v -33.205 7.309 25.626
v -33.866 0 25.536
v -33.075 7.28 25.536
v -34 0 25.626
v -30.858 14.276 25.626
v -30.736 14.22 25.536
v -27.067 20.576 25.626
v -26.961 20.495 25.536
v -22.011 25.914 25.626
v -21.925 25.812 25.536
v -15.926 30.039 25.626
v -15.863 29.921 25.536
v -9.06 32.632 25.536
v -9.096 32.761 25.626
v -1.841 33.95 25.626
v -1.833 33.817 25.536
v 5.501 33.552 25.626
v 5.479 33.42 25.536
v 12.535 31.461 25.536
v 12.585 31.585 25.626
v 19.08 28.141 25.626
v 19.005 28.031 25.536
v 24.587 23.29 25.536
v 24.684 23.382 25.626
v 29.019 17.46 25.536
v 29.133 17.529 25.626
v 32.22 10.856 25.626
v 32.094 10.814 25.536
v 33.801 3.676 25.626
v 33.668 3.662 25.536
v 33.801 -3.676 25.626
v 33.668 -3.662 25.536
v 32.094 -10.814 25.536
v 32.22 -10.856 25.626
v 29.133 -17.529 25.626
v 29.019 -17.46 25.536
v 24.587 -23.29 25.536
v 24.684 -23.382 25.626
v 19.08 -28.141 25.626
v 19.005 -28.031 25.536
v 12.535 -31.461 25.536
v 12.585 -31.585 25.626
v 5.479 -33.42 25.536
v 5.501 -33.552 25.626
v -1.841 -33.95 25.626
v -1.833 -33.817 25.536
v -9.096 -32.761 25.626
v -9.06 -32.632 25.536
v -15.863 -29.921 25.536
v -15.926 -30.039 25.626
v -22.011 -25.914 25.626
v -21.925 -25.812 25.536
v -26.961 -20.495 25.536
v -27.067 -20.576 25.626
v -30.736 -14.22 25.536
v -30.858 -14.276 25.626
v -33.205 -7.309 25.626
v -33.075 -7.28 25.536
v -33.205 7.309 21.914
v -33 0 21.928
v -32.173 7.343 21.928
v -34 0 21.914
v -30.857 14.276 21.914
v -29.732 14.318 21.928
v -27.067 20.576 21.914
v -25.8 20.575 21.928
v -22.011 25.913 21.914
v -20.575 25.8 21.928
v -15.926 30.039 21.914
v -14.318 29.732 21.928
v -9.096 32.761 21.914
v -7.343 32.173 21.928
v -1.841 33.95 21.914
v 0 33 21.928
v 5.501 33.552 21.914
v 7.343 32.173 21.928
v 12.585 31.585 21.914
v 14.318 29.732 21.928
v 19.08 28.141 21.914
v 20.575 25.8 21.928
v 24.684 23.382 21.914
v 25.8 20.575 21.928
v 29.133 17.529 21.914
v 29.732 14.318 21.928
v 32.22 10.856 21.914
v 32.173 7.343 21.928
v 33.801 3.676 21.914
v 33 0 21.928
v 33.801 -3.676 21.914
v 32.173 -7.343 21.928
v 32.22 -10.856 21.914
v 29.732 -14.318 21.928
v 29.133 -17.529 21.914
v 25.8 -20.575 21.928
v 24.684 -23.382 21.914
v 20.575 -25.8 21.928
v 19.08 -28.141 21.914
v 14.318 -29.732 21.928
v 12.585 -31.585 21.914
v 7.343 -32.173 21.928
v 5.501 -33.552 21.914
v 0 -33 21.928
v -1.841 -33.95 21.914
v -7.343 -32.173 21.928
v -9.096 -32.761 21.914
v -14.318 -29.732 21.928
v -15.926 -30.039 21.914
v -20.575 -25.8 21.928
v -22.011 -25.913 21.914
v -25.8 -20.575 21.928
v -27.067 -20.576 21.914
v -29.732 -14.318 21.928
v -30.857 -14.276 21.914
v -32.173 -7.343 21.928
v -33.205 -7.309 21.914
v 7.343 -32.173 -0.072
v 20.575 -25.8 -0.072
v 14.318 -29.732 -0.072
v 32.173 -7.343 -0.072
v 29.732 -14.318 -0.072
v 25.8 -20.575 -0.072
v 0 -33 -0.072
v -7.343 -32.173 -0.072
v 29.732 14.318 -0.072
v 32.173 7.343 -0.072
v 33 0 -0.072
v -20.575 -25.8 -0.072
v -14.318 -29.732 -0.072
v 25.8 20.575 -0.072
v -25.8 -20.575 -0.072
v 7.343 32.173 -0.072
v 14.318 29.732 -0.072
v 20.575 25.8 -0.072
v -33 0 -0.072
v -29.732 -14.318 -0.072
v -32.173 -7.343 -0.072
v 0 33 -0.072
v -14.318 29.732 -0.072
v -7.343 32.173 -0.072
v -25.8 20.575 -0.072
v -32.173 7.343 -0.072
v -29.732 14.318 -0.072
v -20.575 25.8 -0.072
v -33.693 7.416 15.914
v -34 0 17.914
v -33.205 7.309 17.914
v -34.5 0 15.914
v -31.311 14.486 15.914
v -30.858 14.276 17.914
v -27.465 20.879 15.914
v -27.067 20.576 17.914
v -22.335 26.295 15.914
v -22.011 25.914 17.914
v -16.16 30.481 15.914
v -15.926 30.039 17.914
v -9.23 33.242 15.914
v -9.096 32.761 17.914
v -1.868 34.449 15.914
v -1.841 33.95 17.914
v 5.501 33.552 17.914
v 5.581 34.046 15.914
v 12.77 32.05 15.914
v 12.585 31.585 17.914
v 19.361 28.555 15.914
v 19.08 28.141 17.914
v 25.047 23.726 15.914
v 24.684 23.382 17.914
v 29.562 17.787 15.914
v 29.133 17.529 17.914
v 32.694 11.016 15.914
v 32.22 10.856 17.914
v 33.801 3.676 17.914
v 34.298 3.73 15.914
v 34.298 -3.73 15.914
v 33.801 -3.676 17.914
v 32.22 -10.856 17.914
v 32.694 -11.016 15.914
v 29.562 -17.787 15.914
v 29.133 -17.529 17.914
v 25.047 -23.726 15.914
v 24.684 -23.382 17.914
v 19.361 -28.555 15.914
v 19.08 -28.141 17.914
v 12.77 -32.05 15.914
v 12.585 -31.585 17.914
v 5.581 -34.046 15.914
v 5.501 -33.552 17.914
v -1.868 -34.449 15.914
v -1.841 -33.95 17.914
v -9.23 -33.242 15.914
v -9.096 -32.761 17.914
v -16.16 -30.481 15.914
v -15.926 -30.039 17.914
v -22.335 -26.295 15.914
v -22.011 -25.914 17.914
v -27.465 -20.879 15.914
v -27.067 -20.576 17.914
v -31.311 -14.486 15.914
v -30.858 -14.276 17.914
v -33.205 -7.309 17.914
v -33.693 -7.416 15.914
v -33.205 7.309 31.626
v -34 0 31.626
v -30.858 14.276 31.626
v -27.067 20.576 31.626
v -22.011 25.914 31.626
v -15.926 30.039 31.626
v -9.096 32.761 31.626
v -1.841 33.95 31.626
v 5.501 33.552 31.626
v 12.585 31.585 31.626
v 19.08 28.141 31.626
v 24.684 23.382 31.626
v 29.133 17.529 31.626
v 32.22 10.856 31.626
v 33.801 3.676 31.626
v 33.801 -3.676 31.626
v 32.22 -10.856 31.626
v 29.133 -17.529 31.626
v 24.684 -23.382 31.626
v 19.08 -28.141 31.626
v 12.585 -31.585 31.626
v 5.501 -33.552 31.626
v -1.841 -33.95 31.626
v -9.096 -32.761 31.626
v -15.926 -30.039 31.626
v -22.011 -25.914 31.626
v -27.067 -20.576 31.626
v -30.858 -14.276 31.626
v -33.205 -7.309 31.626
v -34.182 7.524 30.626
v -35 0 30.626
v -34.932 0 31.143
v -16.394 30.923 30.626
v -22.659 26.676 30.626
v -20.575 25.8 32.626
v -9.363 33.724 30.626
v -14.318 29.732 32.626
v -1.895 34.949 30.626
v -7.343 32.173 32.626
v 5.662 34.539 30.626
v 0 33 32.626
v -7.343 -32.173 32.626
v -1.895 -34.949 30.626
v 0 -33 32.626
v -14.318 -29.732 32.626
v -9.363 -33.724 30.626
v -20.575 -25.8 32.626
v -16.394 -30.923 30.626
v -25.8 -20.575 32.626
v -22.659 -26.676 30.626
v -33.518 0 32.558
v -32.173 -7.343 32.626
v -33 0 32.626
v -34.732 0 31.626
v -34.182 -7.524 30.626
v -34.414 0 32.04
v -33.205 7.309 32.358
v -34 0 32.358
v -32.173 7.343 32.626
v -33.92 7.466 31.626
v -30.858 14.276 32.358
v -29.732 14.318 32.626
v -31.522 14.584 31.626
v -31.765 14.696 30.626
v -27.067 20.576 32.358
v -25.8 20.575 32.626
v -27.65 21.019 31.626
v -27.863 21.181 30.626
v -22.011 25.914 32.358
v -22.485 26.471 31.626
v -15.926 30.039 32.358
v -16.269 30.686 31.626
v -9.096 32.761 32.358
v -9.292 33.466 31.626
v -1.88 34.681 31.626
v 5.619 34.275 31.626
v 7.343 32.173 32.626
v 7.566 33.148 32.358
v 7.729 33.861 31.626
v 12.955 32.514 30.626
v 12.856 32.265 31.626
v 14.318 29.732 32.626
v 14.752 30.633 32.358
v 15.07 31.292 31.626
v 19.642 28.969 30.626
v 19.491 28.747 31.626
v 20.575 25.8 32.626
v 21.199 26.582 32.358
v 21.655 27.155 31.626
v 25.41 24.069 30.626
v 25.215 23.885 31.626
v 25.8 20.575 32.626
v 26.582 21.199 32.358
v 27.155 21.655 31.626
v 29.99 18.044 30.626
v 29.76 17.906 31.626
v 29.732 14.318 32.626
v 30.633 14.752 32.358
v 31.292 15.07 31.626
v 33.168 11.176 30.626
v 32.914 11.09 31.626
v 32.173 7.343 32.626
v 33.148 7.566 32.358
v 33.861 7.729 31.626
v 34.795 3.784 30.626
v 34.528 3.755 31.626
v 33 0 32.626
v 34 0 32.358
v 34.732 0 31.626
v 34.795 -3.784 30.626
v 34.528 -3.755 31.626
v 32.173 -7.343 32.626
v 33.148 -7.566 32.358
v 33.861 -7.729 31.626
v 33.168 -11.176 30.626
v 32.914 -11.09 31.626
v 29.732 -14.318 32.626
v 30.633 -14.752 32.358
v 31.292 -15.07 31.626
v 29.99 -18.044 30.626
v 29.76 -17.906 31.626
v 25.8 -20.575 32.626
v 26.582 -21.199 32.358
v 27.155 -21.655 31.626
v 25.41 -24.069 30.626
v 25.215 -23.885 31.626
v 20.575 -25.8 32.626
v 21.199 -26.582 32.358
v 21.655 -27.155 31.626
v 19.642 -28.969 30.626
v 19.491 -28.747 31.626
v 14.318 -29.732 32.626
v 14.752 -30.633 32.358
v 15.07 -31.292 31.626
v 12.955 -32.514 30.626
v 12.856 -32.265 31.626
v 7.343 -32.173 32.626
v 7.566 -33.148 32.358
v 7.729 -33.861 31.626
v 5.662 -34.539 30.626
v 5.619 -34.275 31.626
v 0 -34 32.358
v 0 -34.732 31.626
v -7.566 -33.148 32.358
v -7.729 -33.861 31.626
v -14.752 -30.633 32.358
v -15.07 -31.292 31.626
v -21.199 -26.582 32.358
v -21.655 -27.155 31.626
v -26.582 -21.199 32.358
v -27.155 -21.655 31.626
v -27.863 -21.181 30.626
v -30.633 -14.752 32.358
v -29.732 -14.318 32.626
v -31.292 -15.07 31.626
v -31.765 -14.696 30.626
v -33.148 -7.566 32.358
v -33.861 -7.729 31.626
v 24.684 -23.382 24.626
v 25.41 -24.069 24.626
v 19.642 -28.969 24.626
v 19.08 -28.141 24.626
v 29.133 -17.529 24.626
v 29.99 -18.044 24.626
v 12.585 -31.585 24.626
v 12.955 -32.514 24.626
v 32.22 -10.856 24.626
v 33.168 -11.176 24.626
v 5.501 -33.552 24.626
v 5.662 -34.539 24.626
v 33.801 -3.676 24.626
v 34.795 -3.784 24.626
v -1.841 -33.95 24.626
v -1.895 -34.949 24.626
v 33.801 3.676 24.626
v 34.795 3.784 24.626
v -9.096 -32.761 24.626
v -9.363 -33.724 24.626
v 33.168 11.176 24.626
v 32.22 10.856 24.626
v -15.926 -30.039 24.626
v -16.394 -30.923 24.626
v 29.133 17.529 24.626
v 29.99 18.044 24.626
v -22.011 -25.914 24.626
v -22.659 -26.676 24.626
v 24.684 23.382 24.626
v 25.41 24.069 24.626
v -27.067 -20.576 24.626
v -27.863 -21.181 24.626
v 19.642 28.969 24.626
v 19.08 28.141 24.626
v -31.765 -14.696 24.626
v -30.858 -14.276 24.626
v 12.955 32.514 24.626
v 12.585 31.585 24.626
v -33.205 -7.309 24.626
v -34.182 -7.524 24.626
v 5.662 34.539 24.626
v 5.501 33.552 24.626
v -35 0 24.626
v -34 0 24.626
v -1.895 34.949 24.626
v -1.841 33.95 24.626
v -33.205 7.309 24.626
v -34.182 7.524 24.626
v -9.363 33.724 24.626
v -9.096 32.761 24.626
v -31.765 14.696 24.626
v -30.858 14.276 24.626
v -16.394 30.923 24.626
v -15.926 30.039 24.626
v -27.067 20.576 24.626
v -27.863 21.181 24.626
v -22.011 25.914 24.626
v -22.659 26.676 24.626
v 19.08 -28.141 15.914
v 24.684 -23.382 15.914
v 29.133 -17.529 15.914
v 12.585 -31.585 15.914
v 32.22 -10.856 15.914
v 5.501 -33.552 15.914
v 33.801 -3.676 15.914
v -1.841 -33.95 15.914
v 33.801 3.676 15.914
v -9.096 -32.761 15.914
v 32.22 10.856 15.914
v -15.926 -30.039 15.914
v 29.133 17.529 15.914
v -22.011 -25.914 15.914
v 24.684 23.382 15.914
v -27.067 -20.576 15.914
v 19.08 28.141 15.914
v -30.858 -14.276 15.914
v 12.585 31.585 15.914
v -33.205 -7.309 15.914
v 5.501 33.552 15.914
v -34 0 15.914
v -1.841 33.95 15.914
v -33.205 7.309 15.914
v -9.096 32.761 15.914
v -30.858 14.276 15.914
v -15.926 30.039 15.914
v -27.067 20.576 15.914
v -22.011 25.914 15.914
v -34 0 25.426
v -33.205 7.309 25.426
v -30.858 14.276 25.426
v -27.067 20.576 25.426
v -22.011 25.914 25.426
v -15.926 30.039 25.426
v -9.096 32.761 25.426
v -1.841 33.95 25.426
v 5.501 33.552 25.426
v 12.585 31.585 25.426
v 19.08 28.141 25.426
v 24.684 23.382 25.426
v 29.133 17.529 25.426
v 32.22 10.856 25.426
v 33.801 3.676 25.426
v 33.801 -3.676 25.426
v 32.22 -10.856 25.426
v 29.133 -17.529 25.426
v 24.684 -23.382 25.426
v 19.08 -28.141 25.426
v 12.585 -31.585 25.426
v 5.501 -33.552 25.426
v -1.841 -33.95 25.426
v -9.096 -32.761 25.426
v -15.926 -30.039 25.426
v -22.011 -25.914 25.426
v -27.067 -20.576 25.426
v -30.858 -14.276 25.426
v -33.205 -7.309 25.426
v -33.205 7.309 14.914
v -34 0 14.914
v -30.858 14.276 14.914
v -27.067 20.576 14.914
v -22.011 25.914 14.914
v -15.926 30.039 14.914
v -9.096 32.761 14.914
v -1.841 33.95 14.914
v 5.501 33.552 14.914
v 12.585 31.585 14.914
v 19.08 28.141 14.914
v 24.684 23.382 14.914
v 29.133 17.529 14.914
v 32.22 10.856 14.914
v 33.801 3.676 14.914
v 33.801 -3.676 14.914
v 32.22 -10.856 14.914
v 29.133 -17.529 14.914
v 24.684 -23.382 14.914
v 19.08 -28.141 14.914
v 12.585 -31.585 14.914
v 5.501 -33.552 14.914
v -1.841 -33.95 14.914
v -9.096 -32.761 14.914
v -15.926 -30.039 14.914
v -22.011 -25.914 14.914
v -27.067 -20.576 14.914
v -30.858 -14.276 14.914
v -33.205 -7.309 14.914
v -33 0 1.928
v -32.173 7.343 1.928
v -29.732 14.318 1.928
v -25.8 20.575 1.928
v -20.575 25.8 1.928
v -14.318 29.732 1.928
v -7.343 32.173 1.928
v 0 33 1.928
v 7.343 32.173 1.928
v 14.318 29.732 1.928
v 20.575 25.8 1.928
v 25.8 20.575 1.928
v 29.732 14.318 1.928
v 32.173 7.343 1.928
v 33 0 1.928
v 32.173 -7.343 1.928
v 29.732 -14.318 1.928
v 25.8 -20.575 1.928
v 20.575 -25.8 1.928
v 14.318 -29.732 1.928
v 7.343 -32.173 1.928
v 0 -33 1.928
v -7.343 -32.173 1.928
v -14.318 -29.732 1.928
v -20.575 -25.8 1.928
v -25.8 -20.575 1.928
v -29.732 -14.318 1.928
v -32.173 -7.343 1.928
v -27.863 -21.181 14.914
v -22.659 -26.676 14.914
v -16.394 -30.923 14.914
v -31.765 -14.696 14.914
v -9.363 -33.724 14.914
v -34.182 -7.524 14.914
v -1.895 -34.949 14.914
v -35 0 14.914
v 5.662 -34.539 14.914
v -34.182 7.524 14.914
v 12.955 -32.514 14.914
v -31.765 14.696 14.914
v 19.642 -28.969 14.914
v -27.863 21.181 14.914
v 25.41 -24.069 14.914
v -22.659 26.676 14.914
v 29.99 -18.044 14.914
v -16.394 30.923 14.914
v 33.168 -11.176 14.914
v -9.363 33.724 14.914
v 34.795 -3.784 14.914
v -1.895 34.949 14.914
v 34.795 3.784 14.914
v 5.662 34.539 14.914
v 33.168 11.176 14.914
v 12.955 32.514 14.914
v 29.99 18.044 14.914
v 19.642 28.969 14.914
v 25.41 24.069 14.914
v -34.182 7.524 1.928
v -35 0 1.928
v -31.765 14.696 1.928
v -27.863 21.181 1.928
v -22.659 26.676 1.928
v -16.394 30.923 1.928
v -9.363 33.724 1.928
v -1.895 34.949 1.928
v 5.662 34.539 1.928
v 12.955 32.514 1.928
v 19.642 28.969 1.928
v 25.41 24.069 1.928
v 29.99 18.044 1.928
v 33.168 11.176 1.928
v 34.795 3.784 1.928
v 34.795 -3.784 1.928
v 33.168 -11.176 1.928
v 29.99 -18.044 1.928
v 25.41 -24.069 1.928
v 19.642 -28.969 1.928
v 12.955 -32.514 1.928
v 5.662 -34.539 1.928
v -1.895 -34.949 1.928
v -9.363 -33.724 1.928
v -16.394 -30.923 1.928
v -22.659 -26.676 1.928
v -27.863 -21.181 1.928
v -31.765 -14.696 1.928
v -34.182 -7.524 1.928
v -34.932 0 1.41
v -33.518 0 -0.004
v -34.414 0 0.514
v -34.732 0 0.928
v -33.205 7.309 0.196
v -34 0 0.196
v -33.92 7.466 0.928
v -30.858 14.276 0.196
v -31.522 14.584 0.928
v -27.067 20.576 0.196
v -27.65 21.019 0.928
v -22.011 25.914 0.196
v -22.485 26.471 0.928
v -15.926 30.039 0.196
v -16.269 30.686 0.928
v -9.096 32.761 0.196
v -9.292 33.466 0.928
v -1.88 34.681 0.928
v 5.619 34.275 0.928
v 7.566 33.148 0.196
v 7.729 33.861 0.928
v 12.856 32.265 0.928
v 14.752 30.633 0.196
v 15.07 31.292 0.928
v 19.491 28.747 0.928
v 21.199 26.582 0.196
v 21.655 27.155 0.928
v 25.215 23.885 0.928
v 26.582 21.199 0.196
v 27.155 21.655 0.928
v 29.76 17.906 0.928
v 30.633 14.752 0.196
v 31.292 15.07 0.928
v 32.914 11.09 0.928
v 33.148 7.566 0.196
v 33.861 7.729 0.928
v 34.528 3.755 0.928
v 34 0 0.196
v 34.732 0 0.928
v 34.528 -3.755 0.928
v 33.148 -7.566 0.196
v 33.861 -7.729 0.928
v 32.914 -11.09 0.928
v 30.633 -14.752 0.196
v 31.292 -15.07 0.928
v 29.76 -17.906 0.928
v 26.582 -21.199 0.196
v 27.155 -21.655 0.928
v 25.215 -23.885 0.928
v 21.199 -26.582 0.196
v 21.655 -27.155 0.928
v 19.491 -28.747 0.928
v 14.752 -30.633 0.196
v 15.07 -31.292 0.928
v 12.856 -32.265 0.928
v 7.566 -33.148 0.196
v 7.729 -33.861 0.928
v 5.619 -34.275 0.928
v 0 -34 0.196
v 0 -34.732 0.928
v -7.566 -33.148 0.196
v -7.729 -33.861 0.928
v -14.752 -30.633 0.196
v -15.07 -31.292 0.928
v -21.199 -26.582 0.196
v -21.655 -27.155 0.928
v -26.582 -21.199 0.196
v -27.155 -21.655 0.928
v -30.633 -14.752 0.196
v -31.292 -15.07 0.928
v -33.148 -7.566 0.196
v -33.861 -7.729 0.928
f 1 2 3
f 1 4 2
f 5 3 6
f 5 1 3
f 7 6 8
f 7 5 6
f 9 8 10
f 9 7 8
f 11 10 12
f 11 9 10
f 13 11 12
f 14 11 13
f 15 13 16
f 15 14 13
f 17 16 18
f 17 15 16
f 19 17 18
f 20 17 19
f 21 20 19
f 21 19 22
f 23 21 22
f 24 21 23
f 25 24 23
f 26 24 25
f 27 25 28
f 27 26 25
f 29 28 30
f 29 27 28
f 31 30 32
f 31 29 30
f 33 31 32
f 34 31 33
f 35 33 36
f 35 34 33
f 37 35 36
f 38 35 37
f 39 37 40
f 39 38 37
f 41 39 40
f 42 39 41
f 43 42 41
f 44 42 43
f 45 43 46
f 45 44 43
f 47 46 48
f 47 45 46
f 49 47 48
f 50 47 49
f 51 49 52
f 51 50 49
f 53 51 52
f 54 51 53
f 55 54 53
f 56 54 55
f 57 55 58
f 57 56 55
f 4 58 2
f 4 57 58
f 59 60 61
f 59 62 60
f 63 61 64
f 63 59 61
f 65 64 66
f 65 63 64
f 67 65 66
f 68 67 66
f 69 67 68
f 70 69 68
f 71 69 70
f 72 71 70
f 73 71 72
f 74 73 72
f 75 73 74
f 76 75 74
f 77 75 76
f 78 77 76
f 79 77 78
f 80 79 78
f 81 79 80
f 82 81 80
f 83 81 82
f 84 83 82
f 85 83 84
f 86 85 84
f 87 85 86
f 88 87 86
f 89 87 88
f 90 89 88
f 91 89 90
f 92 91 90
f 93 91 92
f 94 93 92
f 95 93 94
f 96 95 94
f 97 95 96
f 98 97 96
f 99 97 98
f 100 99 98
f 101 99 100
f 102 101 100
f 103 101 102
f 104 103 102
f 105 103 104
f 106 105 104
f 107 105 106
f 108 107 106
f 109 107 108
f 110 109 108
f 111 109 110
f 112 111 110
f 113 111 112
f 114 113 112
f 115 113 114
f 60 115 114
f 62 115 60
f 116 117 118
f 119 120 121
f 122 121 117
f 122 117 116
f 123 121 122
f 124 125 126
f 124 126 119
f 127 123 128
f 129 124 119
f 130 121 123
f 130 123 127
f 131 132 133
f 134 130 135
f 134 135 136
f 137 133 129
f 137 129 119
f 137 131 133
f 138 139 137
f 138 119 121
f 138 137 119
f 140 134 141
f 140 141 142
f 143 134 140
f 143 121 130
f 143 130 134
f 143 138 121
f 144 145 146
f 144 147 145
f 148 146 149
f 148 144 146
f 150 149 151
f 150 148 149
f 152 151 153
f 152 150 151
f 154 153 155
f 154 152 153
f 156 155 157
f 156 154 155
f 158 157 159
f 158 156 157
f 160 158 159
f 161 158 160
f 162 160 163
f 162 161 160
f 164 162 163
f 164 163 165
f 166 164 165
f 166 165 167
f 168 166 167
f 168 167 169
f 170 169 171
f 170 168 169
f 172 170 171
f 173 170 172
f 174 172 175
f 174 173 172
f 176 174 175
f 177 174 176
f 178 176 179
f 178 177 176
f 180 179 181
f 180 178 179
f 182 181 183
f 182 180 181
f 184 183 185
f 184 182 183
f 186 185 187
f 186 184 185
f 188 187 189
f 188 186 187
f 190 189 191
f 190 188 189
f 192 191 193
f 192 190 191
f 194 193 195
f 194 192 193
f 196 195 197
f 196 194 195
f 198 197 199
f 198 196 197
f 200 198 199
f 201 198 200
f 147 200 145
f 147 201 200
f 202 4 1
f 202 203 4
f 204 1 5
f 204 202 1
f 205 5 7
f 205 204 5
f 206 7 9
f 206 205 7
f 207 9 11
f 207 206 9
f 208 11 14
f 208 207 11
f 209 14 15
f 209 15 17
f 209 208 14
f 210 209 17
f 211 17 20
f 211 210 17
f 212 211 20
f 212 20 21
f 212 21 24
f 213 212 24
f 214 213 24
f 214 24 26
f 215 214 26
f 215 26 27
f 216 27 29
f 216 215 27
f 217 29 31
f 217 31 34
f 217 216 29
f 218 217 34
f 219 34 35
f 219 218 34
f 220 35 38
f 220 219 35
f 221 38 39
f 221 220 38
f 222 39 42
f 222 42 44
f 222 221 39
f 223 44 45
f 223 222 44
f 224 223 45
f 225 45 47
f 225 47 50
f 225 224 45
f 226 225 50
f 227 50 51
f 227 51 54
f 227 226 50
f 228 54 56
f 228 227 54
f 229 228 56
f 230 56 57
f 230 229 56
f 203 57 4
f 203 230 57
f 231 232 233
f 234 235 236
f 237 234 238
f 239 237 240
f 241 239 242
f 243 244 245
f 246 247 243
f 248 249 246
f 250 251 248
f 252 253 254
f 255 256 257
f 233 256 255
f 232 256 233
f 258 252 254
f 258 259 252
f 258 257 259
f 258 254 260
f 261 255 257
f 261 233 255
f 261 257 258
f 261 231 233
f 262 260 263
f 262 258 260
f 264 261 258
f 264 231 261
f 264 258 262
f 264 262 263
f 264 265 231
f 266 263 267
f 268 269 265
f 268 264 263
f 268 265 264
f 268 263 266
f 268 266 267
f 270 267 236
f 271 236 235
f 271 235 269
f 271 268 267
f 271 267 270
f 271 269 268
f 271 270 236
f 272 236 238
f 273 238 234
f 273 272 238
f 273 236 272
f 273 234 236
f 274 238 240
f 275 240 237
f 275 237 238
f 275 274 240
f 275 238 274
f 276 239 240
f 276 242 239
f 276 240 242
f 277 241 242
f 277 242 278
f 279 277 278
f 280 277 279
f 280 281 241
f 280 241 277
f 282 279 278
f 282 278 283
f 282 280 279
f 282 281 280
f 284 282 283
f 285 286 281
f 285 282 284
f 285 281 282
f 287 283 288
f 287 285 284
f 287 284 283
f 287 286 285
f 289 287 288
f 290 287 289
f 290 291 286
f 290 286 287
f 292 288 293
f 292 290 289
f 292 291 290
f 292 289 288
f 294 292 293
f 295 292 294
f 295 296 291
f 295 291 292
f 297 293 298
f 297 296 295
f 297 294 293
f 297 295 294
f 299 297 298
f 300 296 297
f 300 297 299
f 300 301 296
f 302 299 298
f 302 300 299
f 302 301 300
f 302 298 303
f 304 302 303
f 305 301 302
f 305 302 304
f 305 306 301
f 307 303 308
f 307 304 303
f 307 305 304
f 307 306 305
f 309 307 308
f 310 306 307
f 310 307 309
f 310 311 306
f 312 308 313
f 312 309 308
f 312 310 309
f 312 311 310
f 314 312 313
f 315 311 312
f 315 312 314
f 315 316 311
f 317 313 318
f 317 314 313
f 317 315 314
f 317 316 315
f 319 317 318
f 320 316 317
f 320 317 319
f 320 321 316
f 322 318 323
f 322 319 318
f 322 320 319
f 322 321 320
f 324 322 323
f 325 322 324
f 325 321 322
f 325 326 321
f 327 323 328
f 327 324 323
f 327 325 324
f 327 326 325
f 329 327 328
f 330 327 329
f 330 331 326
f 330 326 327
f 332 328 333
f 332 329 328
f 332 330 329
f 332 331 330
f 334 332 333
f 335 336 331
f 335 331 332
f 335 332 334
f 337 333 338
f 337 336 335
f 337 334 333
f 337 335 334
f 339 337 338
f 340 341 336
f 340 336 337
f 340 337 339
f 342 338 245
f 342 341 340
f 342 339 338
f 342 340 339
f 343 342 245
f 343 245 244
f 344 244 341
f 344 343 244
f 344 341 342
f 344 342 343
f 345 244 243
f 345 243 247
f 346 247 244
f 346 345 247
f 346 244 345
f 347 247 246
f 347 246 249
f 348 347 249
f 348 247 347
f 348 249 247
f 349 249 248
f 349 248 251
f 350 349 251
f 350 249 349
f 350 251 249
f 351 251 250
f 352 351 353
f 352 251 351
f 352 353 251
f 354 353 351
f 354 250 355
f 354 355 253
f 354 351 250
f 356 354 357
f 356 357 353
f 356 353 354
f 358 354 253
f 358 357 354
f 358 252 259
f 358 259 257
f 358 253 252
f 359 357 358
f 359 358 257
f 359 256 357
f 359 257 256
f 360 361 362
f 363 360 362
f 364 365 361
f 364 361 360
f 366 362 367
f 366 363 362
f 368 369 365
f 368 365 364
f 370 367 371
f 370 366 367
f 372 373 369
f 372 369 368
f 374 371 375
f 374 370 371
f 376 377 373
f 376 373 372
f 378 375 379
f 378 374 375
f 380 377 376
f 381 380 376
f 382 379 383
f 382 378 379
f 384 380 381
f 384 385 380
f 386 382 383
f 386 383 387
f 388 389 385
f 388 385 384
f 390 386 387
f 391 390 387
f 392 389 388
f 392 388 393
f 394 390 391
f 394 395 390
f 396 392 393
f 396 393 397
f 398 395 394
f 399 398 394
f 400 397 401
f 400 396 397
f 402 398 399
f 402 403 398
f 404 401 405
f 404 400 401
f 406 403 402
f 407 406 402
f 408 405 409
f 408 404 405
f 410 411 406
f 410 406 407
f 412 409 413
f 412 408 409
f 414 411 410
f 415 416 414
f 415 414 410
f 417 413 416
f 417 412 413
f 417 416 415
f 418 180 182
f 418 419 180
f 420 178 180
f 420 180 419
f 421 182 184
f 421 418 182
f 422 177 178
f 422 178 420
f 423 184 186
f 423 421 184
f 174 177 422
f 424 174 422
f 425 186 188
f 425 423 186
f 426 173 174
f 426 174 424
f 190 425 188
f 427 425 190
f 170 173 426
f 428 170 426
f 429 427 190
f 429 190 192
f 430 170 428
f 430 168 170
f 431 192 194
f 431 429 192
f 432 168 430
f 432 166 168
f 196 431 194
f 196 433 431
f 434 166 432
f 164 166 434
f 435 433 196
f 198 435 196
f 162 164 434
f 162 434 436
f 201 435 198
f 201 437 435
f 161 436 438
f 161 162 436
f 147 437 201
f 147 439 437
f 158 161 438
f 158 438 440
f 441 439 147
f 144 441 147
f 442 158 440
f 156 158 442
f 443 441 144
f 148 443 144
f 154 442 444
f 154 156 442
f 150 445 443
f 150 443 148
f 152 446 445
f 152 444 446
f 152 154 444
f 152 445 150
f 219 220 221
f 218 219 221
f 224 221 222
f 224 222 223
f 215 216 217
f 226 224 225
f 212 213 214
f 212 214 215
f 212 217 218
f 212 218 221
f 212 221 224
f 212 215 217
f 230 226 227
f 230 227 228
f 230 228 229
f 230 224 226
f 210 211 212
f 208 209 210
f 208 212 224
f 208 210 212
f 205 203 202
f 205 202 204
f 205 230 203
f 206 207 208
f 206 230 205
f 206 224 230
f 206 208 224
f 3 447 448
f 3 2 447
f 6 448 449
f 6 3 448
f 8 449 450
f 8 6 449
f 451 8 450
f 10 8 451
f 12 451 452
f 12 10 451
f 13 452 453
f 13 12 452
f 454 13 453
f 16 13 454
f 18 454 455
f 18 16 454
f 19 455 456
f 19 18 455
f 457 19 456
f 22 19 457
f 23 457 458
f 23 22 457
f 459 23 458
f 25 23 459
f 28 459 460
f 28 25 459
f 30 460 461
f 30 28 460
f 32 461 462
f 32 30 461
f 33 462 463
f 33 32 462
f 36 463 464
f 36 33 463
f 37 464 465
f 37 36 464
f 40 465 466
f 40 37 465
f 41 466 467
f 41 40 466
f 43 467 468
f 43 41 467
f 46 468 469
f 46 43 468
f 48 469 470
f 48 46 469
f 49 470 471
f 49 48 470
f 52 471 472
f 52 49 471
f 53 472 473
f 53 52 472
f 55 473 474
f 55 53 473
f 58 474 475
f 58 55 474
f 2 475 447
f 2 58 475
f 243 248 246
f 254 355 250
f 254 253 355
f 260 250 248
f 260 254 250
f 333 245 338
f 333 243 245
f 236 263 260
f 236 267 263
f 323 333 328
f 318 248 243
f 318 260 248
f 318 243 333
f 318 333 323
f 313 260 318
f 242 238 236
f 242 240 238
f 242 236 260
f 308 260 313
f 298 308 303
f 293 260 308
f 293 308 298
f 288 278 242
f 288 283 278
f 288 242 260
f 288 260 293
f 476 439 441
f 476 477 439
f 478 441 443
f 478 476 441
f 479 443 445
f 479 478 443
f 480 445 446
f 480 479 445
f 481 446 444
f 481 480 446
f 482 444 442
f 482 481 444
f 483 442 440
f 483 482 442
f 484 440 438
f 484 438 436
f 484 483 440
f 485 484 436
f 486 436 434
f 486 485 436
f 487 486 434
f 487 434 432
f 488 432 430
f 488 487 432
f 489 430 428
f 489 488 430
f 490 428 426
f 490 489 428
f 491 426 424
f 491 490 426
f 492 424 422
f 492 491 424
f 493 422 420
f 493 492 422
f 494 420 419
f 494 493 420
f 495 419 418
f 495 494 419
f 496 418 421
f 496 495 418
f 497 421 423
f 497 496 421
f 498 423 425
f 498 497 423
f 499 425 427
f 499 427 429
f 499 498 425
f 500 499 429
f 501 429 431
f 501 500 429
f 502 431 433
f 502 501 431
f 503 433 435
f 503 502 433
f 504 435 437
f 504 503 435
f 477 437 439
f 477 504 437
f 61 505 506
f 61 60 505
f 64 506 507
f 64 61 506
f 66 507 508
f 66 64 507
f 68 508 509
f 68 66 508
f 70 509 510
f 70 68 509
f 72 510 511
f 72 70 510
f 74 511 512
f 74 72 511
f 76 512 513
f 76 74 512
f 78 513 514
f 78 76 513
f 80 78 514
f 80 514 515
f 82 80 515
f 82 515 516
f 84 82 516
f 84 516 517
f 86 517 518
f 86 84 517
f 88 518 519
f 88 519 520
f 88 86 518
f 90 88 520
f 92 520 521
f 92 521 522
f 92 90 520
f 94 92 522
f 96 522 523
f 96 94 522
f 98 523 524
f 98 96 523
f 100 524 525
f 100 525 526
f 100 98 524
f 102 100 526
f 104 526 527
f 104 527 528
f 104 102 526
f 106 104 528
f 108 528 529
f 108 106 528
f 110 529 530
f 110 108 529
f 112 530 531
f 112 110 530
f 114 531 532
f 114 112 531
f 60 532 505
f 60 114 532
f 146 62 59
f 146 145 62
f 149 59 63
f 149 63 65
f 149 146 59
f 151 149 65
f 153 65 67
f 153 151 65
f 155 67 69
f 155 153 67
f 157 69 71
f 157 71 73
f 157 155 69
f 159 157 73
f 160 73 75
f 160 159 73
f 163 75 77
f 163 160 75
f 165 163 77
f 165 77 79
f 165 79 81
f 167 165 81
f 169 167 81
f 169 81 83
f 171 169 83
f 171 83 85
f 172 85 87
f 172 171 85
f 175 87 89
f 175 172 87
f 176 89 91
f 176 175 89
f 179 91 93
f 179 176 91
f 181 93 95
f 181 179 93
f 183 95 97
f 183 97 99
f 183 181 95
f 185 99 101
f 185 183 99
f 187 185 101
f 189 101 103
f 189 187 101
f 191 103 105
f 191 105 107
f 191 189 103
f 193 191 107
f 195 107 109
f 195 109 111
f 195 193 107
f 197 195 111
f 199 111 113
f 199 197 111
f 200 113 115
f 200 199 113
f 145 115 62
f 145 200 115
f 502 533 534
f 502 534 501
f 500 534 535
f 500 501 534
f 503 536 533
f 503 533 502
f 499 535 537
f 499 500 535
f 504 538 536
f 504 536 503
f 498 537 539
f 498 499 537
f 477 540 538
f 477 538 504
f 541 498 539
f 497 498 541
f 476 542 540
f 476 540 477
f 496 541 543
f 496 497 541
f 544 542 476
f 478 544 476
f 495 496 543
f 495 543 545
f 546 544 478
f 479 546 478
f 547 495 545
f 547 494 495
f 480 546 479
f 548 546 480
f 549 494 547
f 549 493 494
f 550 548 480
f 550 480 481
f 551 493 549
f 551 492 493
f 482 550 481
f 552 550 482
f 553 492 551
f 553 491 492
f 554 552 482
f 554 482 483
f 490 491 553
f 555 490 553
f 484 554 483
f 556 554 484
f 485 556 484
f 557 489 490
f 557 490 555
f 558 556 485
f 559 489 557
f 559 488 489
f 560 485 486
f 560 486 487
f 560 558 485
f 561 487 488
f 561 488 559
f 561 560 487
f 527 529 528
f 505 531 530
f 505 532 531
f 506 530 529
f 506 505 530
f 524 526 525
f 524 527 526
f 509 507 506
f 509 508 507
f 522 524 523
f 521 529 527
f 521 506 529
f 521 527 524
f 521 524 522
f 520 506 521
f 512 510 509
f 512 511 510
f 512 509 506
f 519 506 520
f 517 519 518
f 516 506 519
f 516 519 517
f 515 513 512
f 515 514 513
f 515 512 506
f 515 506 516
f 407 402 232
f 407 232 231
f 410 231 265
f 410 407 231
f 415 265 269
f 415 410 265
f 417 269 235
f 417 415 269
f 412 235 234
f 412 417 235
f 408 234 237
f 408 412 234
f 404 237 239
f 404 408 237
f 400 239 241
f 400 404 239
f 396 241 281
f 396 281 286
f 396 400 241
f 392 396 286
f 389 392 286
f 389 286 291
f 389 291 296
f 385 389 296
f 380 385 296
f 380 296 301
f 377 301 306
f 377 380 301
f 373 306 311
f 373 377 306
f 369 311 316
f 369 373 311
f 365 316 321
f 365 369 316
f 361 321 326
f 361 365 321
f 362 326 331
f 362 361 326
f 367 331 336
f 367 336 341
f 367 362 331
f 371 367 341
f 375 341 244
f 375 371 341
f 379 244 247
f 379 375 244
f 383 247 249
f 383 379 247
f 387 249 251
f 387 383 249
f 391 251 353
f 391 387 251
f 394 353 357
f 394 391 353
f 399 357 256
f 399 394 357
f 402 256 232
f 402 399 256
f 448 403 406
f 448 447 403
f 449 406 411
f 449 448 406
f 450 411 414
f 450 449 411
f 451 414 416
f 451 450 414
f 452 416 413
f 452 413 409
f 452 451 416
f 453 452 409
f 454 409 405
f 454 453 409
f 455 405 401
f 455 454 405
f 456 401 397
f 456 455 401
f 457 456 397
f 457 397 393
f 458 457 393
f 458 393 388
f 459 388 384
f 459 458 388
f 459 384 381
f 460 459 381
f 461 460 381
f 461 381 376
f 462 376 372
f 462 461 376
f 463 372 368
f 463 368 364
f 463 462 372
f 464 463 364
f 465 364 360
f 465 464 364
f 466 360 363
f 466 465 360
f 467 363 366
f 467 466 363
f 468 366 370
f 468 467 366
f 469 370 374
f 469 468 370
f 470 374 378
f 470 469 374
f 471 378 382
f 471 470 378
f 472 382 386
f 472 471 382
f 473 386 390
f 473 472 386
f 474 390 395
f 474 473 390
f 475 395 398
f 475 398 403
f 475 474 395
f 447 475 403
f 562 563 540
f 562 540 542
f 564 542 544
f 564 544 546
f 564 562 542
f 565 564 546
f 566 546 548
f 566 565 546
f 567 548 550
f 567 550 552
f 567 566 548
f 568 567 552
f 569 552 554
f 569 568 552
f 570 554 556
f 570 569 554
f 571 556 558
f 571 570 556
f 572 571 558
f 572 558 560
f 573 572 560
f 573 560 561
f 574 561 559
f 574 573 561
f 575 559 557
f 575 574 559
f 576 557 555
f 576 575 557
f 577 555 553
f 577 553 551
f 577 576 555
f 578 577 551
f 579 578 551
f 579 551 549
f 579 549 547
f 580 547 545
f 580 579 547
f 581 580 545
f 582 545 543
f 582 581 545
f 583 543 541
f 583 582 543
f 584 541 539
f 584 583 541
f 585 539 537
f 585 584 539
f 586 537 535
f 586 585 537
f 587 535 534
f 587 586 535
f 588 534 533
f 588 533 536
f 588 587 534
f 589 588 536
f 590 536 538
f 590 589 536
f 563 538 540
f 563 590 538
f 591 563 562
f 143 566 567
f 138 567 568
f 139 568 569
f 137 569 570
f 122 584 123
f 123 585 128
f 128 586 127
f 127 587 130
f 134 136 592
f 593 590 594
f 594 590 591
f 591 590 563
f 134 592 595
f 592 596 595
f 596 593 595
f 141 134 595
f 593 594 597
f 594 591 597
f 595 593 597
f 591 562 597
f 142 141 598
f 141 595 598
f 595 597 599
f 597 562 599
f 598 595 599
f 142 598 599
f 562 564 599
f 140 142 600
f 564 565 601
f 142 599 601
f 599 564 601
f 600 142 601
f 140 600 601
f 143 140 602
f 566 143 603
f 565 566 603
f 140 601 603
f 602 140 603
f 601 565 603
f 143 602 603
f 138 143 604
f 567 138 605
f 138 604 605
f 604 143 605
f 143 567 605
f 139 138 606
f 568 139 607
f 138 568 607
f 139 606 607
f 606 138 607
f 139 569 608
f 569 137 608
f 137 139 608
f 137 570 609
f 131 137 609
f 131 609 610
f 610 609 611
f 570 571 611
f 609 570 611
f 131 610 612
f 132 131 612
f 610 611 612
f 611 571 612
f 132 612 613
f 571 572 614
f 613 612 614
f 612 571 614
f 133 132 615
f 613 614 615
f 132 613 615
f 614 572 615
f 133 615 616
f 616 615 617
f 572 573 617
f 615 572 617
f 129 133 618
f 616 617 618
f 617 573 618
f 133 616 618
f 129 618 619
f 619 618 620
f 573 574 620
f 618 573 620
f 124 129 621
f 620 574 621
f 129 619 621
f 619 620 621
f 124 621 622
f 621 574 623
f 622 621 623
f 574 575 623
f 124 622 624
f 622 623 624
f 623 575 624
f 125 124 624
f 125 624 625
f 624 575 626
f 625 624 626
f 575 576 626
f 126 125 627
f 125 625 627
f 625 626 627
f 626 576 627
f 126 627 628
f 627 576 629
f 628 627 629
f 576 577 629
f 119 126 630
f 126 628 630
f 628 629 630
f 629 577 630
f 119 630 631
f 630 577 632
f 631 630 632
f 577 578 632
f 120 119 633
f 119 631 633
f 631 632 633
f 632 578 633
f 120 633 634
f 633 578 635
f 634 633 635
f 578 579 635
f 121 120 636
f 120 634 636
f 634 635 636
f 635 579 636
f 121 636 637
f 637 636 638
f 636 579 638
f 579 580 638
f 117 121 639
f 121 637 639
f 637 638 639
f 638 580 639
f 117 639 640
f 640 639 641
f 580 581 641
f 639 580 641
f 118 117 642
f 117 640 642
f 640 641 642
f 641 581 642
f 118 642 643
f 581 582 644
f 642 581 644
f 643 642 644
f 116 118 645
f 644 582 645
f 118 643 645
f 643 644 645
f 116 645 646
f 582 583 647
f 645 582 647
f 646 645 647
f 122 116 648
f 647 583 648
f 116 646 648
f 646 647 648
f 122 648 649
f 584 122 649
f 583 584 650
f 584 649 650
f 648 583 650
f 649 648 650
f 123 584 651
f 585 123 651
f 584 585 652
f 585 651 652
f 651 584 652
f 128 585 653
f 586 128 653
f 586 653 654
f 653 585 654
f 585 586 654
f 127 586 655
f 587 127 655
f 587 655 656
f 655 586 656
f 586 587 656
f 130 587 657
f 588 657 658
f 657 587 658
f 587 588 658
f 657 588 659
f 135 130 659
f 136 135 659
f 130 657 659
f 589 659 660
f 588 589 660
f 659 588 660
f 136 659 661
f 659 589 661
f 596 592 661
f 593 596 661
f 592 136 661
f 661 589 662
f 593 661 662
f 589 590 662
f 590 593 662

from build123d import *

# Parameters (mm, degrees)
F2_R = 2


with BuildPart() as f1:
    # F0 (on Front) → F1 (revolve)
    with BuildSketch(Plane.XZ):
        Polygon((-35, -0.072111), (0, -0.072111), (0, 1.927889), (-33, 1.927889), (-33, 21.927889), (-33.999902, 21.913878), (-34, 17.913878), (-34.5, 15.913878), (-34, 15.913878), (-34, 14.913878), (-35, 14.913878), align=None)
        Polygon((0, 32.625808), (-35, 32.625808), (-35, 24.625808), (-34, 24.625808), (-34, 25.425808), (-34, 25.625808), (-34, 31.625808), (0, 31.625808), align=None)
        Polygon((-34, 25.625808), (-34, 25.425808), (-33.866413, 25.536358), align=None)
    revolve(axis=Axis((0, 0, 0.927889), (0, 0, -1)))

    # F2
    f2_edges = [f1.edges().sort_by_distance(p)[0] for p in [
        (35, 0, 32.625808),
        (35, 0, -0.072111),
    ]]
    fillet(f2_edges, radius=F2_R)


solid = f1.part
